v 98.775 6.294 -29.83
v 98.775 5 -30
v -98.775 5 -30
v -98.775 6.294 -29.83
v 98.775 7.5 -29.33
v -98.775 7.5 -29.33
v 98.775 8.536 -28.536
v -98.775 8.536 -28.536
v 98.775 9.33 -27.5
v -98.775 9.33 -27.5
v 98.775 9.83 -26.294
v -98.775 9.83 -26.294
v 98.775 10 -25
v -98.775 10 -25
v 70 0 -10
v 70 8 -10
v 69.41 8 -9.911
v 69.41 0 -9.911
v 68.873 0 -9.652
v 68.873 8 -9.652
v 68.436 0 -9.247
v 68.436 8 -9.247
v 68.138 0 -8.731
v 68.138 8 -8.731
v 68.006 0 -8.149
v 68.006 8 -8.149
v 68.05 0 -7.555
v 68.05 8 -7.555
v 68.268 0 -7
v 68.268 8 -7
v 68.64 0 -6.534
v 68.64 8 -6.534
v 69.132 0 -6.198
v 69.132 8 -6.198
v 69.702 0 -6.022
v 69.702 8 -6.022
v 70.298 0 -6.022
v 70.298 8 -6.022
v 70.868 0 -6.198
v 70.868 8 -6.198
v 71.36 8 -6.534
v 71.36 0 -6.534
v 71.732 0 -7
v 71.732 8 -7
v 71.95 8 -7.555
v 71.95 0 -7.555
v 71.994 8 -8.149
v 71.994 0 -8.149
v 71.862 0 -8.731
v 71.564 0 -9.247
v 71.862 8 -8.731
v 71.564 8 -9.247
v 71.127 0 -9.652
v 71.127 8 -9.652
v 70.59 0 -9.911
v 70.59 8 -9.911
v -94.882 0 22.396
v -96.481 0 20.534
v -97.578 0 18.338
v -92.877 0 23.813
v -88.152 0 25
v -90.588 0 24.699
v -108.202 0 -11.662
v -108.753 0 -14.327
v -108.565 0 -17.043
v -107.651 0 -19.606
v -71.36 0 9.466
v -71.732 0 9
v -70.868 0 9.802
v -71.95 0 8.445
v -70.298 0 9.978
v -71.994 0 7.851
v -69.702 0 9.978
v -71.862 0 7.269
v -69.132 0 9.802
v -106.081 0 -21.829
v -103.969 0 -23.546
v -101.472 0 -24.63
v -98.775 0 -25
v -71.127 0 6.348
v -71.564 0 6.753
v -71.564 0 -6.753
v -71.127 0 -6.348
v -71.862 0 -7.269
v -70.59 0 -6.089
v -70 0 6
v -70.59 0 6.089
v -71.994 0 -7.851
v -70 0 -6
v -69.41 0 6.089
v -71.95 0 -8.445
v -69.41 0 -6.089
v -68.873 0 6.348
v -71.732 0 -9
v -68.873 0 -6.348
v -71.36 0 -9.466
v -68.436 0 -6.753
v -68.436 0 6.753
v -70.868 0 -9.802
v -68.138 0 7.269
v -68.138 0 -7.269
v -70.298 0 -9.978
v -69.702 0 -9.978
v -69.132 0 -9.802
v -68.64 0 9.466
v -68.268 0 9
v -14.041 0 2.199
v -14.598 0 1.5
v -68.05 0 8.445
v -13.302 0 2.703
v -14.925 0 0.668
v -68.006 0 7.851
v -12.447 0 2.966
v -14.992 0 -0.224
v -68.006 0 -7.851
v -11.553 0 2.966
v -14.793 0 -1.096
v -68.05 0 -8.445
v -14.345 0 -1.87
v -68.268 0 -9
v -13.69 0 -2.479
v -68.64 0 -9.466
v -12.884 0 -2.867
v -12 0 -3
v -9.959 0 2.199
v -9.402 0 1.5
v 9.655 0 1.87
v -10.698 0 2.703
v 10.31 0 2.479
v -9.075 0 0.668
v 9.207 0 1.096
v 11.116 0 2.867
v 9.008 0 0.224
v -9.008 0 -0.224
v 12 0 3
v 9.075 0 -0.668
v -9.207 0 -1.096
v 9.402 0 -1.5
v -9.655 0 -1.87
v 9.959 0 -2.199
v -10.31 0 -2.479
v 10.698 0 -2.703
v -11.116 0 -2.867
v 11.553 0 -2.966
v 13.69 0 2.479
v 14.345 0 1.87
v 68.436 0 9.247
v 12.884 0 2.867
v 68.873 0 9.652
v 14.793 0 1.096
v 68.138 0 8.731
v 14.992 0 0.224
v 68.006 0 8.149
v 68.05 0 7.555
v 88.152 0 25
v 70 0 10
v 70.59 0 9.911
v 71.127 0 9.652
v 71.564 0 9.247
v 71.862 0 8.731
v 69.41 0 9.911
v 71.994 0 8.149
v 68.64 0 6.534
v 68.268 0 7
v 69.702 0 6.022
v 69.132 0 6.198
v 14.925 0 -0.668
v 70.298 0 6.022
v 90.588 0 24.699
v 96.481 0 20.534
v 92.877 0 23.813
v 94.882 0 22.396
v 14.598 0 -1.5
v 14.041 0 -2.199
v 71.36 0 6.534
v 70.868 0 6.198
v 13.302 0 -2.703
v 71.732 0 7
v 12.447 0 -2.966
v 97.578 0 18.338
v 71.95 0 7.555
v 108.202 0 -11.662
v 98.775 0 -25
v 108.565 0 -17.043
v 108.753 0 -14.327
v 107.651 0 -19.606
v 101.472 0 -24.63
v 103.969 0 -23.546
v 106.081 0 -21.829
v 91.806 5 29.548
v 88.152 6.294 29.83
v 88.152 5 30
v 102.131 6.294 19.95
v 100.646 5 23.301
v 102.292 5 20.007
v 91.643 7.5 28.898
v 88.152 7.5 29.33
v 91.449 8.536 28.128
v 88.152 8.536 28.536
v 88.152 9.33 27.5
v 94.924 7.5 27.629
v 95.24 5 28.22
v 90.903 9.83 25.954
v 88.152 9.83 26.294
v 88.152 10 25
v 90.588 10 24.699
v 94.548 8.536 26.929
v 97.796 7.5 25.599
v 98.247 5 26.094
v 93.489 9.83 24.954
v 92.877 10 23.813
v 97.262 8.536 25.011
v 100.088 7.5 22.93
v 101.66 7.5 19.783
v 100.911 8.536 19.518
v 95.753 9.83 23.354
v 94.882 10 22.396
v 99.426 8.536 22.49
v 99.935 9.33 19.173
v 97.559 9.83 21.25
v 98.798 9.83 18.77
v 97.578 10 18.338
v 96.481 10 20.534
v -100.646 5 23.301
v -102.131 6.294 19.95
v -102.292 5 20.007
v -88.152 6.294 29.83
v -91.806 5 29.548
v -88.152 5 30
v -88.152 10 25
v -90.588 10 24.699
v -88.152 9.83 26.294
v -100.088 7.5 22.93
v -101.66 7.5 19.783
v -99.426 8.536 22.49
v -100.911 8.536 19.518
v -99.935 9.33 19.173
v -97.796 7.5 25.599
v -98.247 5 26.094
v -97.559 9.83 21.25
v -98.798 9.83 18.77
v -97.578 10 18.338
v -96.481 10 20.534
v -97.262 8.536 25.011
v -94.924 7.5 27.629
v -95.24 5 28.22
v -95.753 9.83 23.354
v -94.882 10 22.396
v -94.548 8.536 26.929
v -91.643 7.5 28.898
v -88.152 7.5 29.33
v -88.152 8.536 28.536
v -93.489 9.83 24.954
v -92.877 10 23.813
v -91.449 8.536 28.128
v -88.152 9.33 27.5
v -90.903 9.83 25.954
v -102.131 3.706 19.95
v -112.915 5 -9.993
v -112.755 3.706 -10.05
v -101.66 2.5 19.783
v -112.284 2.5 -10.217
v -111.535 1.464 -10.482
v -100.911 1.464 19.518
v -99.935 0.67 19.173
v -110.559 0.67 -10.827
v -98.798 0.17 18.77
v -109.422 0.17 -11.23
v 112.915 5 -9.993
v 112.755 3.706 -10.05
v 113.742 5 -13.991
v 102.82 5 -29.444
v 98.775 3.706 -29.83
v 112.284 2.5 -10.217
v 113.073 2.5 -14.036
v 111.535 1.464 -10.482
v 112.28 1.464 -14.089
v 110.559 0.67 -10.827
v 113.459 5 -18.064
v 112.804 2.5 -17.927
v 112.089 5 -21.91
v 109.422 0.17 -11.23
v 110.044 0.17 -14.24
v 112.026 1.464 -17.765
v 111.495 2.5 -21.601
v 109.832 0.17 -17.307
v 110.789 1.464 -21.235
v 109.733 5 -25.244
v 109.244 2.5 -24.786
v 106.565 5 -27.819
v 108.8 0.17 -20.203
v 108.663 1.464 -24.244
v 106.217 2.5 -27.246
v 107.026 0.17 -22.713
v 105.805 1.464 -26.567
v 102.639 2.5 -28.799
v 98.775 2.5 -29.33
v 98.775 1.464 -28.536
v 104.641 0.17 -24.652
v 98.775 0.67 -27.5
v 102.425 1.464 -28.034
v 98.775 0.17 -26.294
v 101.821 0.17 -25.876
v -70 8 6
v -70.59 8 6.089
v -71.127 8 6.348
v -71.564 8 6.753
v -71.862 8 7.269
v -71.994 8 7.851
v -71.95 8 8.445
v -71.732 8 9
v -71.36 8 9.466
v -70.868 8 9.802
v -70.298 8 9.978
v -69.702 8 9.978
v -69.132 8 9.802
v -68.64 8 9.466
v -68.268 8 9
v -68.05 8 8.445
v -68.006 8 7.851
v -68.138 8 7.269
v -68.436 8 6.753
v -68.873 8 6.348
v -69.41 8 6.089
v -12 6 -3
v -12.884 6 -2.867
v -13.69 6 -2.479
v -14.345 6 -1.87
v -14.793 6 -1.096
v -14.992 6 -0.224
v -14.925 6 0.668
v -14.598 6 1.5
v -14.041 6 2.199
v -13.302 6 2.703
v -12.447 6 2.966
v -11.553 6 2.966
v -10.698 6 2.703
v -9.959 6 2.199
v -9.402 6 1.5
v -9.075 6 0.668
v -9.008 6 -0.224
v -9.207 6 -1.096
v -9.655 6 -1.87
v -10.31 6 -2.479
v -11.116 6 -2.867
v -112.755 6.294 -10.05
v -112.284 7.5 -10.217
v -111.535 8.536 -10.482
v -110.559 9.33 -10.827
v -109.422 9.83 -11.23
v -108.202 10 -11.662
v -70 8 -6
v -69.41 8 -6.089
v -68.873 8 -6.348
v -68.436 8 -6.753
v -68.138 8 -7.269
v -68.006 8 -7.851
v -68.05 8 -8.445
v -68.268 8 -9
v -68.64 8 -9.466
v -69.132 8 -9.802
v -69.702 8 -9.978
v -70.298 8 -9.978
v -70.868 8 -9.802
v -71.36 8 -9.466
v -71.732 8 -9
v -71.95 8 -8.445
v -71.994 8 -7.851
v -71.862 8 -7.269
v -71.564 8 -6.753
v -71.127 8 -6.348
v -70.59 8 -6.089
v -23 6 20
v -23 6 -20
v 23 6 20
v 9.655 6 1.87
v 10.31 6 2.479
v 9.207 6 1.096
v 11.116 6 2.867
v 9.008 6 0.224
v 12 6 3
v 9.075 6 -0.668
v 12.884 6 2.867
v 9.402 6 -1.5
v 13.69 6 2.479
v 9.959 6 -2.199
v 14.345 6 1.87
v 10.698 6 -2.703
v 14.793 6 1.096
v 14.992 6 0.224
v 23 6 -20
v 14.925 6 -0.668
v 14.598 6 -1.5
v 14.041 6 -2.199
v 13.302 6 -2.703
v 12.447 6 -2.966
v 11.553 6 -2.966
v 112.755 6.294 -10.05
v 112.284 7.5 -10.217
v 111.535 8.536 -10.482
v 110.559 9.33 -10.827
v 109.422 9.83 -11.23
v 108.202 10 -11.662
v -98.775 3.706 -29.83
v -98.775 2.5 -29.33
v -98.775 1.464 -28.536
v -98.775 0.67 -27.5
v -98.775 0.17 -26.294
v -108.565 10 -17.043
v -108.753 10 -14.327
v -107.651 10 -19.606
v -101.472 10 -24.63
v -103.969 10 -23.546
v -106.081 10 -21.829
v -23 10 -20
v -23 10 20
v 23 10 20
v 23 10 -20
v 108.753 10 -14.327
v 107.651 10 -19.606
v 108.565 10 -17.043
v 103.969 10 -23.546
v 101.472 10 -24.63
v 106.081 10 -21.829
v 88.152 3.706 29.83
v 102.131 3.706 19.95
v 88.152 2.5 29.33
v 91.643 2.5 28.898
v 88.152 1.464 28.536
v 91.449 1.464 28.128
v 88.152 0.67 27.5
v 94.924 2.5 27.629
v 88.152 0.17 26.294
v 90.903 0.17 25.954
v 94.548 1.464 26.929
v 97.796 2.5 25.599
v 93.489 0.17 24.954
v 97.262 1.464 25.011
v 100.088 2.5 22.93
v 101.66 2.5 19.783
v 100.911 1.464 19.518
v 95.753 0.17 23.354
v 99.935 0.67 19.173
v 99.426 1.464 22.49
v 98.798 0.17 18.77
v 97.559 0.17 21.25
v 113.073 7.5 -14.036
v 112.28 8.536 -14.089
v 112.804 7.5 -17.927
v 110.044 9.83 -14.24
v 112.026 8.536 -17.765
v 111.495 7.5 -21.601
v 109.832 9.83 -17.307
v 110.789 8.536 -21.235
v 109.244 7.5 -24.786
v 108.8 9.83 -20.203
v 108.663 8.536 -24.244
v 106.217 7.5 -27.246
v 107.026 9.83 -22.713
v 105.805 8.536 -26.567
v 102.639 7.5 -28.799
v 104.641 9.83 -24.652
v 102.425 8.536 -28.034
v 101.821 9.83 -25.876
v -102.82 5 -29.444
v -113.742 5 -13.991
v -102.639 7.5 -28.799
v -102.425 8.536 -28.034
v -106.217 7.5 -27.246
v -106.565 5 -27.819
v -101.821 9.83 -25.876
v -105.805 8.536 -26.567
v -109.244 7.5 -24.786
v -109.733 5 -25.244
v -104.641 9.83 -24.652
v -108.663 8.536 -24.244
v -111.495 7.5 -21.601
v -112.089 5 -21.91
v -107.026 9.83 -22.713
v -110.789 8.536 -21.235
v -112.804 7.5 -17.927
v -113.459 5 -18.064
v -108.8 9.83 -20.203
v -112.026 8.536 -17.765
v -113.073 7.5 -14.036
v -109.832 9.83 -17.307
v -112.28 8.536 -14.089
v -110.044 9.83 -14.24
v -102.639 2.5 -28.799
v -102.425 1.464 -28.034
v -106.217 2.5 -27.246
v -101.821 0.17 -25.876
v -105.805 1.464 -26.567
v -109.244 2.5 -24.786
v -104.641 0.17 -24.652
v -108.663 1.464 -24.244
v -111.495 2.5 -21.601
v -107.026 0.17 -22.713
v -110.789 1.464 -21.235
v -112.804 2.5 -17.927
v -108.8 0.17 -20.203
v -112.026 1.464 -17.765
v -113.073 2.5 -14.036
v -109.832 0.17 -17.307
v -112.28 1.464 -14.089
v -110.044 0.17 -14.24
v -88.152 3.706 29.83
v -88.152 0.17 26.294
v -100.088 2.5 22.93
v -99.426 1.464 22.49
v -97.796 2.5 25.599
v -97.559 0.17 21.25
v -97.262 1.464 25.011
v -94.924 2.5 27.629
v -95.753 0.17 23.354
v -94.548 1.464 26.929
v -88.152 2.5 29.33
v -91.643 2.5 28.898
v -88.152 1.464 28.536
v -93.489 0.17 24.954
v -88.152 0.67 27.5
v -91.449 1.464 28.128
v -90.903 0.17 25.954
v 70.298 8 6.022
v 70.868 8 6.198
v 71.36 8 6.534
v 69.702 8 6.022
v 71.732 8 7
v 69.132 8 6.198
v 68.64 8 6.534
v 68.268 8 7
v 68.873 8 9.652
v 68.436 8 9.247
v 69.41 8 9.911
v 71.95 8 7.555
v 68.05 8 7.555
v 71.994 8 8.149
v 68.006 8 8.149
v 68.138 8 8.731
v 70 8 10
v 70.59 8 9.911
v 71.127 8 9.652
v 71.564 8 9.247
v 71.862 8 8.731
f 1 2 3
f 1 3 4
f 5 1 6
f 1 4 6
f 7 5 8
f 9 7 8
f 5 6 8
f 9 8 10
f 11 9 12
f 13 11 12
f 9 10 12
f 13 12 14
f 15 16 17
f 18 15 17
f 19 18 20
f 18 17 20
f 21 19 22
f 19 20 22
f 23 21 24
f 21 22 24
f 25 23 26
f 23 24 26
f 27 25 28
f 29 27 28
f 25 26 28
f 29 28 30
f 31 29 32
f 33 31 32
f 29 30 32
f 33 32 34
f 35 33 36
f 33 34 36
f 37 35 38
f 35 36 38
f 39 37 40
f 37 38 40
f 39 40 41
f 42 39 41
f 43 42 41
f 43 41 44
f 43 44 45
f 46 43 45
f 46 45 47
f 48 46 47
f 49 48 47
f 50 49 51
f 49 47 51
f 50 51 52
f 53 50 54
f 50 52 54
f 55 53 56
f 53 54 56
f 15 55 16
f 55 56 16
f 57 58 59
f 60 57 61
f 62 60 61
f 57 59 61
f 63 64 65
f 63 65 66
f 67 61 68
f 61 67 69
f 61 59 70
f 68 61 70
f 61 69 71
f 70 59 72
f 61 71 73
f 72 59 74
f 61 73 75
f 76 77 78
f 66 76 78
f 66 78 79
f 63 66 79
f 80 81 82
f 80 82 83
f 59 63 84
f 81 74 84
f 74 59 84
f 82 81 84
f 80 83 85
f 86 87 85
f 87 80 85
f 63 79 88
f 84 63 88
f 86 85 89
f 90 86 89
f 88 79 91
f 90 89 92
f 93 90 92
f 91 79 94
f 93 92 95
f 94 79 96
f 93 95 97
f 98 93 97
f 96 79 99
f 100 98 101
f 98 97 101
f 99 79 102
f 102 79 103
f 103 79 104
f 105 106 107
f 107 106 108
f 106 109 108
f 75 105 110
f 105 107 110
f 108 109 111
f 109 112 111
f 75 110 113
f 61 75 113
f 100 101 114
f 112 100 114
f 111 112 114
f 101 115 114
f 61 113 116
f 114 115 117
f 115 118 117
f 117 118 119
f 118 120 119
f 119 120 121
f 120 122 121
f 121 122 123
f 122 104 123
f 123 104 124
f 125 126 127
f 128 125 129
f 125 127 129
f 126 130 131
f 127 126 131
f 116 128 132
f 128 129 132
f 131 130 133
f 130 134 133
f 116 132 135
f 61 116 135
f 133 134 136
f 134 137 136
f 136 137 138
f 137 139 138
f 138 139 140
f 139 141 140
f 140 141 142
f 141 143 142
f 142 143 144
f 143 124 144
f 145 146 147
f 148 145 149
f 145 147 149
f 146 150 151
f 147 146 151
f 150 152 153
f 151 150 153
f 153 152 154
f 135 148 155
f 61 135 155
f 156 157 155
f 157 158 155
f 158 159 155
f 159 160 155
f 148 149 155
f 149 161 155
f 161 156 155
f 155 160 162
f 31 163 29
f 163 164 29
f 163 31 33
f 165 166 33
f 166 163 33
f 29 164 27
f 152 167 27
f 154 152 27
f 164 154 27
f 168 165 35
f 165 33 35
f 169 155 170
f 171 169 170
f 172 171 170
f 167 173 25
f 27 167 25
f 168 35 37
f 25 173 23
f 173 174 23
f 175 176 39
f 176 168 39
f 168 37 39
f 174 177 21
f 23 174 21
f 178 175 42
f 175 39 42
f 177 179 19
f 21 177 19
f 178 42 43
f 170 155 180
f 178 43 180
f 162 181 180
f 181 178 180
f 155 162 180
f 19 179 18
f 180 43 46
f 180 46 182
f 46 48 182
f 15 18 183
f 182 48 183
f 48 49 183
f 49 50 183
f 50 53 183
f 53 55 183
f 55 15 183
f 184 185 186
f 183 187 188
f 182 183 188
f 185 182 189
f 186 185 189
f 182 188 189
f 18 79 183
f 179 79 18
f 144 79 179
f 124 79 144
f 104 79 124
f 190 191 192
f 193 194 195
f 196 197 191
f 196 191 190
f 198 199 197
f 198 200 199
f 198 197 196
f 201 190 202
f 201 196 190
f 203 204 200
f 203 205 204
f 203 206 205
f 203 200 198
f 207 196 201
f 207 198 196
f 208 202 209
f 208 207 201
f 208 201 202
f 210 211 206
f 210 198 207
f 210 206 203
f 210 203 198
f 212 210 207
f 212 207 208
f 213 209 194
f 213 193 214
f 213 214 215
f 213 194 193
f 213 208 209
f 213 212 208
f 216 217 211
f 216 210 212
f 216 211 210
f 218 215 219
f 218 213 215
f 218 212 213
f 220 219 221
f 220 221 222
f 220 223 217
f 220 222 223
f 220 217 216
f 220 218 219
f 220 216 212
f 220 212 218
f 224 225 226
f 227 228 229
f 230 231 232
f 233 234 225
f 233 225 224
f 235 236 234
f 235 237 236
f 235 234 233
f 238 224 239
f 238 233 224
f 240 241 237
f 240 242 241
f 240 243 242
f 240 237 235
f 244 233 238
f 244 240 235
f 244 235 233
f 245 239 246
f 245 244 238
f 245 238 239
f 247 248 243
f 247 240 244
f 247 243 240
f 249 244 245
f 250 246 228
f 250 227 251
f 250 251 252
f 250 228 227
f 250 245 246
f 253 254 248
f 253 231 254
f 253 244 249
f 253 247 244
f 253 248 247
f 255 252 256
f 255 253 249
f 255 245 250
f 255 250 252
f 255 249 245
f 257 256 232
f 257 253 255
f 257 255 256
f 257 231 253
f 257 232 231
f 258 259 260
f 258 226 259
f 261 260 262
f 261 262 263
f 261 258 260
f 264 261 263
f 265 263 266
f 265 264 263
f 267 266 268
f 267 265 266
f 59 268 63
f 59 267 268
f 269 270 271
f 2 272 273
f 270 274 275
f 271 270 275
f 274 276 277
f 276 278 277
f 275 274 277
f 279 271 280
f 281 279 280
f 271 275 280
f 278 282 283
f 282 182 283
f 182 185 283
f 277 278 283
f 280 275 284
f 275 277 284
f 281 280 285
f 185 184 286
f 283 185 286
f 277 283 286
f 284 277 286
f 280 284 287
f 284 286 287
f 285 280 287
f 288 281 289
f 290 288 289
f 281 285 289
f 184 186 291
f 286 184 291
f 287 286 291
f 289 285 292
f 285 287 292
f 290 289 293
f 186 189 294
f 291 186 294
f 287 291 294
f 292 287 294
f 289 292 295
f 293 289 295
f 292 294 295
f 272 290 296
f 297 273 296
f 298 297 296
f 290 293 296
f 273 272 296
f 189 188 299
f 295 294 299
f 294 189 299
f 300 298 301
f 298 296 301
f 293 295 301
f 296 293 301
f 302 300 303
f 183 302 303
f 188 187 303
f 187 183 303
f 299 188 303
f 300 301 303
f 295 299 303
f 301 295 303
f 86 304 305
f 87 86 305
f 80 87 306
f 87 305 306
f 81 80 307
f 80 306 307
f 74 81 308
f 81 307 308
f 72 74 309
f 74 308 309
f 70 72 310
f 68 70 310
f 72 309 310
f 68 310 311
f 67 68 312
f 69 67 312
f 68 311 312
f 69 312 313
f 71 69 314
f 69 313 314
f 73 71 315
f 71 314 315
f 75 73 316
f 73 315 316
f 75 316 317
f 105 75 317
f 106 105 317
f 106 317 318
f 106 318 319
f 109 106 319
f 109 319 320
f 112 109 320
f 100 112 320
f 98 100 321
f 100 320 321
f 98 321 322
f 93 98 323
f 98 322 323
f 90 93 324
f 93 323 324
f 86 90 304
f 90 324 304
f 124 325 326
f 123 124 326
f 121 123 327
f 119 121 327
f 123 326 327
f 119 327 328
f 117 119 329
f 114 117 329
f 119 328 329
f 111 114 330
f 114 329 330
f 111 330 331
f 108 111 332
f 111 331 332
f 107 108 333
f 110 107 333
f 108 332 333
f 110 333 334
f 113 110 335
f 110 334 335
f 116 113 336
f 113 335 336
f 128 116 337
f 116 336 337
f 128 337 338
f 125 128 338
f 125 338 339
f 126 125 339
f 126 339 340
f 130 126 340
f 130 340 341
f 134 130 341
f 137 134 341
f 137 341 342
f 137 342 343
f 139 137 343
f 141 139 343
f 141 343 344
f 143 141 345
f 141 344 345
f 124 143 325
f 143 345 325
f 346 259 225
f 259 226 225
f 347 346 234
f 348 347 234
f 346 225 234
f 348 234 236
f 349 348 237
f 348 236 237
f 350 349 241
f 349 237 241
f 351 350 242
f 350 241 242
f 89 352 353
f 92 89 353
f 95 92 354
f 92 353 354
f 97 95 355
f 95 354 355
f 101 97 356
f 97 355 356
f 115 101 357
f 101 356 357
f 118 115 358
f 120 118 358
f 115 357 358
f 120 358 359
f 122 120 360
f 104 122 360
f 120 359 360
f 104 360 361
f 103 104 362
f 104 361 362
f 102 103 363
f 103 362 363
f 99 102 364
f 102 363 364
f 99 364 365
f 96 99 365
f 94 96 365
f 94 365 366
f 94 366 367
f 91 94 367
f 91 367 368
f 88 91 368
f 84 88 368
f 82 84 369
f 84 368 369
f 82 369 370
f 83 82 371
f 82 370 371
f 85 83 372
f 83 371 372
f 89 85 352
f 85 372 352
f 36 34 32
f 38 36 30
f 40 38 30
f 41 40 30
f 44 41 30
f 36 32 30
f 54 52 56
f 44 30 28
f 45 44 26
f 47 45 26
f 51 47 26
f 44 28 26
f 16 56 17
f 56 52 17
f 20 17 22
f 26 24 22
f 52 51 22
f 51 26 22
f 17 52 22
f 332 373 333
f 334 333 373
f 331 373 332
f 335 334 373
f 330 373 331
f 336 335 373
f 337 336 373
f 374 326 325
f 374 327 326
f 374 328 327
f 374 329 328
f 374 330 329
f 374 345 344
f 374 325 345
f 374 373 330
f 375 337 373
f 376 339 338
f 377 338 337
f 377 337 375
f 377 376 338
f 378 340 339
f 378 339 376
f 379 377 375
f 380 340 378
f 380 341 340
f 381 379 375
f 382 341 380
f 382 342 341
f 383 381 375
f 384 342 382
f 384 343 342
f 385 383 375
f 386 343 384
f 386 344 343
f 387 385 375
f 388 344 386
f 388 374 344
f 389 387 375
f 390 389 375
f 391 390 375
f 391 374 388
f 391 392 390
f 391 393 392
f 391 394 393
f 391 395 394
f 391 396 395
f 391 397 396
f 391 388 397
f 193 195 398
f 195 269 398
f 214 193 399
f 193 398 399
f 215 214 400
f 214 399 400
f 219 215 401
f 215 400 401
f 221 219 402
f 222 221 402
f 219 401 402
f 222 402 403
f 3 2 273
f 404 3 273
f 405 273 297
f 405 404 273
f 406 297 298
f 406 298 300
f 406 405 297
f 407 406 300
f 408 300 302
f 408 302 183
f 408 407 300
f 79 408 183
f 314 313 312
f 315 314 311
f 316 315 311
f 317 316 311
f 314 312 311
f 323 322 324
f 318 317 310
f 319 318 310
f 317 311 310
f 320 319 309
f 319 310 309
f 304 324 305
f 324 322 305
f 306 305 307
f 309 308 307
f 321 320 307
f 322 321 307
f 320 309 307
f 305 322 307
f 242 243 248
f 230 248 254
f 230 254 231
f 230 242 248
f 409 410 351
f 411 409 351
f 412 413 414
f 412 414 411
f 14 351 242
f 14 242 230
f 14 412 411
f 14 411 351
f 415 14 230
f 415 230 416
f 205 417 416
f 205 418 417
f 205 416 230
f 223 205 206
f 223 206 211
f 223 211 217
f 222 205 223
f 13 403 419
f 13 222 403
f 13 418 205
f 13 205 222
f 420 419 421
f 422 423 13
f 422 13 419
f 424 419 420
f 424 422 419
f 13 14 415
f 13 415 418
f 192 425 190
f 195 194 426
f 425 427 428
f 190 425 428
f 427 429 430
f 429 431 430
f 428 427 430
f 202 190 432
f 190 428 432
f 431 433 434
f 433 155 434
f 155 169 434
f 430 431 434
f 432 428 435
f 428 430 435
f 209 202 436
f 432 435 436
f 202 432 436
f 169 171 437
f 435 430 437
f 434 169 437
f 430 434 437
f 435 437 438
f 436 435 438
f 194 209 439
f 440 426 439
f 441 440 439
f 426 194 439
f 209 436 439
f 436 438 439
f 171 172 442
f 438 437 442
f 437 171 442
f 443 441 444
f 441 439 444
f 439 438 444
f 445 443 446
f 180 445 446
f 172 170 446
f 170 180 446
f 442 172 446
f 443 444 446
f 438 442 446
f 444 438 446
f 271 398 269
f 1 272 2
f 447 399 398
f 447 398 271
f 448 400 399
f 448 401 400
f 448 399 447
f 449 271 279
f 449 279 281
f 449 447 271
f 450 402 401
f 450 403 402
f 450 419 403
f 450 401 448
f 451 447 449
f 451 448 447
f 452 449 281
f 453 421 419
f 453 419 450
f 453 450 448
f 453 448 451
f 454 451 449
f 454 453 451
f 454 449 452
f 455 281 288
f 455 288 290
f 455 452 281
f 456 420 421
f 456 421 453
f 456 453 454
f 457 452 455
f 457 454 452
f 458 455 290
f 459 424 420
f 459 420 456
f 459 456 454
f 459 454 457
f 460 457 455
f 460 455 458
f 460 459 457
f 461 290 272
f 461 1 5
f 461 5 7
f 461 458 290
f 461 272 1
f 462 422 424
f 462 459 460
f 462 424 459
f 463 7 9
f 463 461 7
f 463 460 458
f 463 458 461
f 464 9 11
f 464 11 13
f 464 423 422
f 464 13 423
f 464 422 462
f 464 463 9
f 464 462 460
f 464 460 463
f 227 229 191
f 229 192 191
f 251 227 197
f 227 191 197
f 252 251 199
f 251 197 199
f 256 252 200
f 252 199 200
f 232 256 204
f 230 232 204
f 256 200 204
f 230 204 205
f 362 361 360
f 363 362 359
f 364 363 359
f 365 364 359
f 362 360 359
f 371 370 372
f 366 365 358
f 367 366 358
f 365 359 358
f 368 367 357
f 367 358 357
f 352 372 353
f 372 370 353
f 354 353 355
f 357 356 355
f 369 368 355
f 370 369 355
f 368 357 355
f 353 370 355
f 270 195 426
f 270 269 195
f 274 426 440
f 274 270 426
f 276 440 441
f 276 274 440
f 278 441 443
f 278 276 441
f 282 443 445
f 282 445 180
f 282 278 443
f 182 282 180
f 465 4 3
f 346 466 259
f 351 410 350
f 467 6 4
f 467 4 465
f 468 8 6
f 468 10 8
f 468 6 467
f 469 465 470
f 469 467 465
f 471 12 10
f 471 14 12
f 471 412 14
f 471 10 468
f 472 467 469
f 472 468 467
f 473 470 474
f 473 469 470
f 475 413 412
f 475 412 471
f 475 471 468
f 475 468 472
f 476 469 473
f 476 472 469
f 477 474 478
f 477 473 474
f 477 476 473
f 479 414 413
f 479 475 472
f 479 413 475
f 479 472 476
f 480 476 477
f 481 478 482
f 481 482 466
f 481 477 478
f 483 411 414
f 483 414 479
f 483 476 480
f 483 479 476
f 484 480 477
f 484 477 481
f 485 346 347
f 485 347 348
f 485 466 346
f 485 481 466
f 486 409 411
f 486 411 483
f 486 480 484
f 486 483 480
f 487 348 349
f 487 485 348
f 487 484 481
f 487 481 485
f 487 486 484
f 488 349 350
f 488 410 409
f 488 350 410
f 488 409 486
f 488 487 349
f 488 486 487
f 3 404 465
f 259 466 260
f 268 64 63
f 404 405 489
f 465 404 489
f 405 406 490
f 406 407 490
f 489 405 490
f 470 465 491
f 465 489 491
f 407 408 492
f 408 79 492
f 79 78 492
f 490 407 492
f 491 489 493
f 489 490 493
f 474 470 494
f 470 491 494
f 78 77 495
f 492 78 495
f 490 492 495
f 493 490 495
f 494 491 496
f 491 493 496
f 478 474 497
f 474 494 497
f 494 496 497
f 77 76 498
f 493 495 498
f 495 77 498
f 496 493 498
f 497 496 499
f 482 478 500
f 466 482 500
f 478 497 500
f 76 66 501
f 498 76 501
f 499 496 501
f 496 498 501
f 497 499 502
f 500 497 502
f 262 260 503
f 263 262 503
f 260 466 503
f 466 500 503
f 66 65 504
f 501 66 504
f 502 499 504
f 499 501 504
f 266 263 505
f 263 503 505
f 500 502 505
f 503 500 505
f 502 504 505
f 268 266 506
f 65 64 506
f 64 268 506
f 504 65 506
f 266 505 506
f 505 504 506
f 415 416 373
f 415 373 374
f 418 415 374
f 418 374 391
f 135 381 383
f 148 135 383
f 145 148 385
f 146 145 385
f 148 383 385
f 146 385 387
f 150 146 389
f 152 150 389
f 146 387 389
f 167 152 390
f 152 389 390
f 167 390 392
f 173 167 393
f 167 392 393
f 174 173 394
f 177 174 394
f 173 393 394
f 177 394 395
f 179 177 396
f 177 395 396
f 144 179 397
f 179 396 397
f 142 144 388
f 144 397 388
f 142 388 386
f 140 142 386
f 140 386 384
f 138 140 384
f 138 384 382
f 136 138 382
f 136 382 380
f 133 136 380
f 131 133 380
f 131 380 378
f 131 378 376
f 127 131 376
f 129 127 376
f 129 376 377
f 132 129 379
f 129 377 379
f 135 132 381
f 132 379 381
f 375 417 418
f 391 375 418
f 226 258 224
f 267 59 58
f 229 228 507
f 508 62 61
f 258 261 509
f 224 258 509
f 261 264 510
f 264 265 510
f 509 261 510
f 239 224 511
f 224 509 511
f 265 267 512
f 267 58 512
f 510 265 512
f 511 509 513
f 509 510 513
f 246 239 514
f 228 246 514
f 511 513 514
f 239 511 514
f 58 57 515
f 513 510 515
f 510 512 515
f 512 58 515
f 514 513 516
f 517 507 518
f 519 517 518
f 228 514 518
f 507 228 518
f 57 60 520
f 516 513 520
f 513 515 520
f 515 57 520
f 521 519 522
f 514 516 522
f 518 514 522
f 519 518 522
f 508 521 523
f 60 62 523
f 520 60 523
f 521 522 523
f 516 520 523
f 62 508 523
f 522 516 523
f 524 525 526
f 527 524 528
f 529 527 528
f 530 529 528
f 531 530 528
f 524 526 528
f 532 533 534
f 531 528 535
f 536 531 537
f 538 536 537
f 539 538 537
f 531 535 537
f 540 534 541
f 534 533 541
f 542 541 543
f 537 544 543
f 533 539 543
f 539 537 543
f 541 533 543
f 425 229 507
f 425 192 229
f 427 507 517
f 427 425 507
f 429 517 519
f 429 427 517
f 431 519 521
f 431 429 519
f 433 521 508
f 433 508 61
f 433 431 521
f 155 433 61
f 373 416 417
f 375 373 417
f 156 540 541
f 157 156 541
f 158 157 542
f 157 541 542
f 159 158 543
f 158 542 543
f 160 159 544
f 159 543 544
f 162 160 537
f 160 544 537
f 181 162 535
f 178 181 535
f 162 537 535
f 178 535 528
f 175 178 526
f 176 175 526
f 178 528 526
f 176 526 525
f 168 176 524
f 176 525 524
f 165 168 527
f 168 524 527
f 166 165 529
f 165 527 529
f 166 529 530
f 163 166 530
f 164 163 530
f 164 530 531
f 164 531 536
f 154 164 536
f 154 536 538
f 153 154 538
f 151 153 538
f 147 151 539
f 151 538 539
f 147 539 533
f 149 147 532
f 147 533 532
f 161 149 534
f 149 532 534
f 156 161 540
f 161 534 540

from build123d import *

# Parameters (mm, degrees)
BOSS_EXTRUDE2_DEPTH = 10
FILLET2_R           = 5
SKETCH3_W           = 46
SKETCH3_H           = 40
CUT_EXTRUDE1_DEPTH  = 4
SKETCH4_R           = 3
CUT_EXTRUDE2_DEPTH  = 6
CUT_EXTRUDE3_START  = -2
SKETCH5_R           = 2
CUT_EXTRUDE3_DEPTH  = 8


with BuildPart() as part:
    # Sketch1 → Boss-Extrude2 (new body)
    with BuildSketch(Plane(origin=(0, 0, 0), x_dir=(1, 0, 0), z_dir=(0, 1, 0))):
        with BuildLine():
            Line((-112.915113285, 9.992897111), (-102.291556109, -20.007102889))
            ThreePointArc((-102.291556109, -20.007102889), (-96.809111593, -27.249623327), (-88.151933742, -30))
            Line((-88.151933742, -30), (88.151933742, -30))
            ThreePointArc((88.151933742, -30), (96.809111593, -27.249623327), (102.291556109, -20.007102889))
            Line((102.291556109, -20.007102889), (112.915113285, 9.992897111))
            ThreePointArc((112.915113285, 9.992897111), (111.025114246, 23.657177851), (98.775490918, 30))
            Line((98.775490918, 30), (-98.775490918, 30))
            ThreePointArc((-98.775490918, 30), (-111.025114246, 23.657177851), (-112.915113285, 9.992897111))
        make_face()
    extrude(amount=BOSS_EXTRUDE2_DEPTH)

    # Fillet2
    fillet2_edges = [part.edges().sort_by_distance(p)[0] for p in [
        (111.025114246, 10, -23.657177851),
        (0, 0, -30),
        (-111.025114246, 0, -23.657177851),
        (107.603334697, 10, 5.007102889),
        (96.809111593, 10, 27.249623327),
        (0, 10, 30),
        (-96.809111593, 10, 27.249623327),
        (-107.603334697, 10, 5.007102889),
        (0, 10, -30),
        (-107.603334697, 0, 5.007102889),
        (0, 0, 30),
        (107.603334697, 0, 5.007102889),
    ]]
    fillet(fillet2_edges, radius=FILLET2_R - 0.0001)  # a hair under: the kernel refuses the full size

    # Sketch3 → Cut-Extrude1 (cut)
    with BuildSketch(Plane(origin=(0, 10, 0), x_dir=(1, 0, 0), z_dir=(0, 1, 0))):
        Rectangle(SKETCH3_W, SKETCH3_H)
    extrude(amount=-CUT_EXTRUDE1_DEPTH, mode=Mode.SUBTRACT)

    # Sketch4 → Cut-Extrude2 (cut)
    with BuildSketch(Plane(origin=(0, 6, 0), x_dir=(1, 0, 0), z_dir=(0, 1, 0))):
        with Locations(Location((12, 0, 0), (0, 0, 270))):
            Circle(SKETCH4_R)
        with Locations(Location((-12, 0, 0), (0, 0, 90))):
            Circle(SKETCH4_R)
    extrude(amount=-CUT_EXTRUDE2_DEPTH, mode=Mode.SUBTRACT)

    # Sketch5 → Cut-Extrude3 (cut)
    with BuildSketch(Plane(origin=(0, 10, 0), x_dir=(1, 0, 0), z_dir=(0, 1, 0)).offset(CUT_EXTRUDE3_START)):
        with Locations(Location((-70, 8, 0), (0, 0, 270))):
            Circle(SKETCH5_R)
        with Locations(Location((-70, -8, 0), (0, 0, 90))):
            Circle(SKETCH5_R)
        with Locations(Location((70, -8, 0), (0, 0, 270))):
            Circle(SKETCH5_R)
        with Locations(Location((70, 8, 0), (0, 0, 90))):
            Circle(SKETCH5_R)
    extrude(amount=-CUT_EXTRUDE3_DEPTH, mode=Mode.SUBTRACT)


solid = part.part
